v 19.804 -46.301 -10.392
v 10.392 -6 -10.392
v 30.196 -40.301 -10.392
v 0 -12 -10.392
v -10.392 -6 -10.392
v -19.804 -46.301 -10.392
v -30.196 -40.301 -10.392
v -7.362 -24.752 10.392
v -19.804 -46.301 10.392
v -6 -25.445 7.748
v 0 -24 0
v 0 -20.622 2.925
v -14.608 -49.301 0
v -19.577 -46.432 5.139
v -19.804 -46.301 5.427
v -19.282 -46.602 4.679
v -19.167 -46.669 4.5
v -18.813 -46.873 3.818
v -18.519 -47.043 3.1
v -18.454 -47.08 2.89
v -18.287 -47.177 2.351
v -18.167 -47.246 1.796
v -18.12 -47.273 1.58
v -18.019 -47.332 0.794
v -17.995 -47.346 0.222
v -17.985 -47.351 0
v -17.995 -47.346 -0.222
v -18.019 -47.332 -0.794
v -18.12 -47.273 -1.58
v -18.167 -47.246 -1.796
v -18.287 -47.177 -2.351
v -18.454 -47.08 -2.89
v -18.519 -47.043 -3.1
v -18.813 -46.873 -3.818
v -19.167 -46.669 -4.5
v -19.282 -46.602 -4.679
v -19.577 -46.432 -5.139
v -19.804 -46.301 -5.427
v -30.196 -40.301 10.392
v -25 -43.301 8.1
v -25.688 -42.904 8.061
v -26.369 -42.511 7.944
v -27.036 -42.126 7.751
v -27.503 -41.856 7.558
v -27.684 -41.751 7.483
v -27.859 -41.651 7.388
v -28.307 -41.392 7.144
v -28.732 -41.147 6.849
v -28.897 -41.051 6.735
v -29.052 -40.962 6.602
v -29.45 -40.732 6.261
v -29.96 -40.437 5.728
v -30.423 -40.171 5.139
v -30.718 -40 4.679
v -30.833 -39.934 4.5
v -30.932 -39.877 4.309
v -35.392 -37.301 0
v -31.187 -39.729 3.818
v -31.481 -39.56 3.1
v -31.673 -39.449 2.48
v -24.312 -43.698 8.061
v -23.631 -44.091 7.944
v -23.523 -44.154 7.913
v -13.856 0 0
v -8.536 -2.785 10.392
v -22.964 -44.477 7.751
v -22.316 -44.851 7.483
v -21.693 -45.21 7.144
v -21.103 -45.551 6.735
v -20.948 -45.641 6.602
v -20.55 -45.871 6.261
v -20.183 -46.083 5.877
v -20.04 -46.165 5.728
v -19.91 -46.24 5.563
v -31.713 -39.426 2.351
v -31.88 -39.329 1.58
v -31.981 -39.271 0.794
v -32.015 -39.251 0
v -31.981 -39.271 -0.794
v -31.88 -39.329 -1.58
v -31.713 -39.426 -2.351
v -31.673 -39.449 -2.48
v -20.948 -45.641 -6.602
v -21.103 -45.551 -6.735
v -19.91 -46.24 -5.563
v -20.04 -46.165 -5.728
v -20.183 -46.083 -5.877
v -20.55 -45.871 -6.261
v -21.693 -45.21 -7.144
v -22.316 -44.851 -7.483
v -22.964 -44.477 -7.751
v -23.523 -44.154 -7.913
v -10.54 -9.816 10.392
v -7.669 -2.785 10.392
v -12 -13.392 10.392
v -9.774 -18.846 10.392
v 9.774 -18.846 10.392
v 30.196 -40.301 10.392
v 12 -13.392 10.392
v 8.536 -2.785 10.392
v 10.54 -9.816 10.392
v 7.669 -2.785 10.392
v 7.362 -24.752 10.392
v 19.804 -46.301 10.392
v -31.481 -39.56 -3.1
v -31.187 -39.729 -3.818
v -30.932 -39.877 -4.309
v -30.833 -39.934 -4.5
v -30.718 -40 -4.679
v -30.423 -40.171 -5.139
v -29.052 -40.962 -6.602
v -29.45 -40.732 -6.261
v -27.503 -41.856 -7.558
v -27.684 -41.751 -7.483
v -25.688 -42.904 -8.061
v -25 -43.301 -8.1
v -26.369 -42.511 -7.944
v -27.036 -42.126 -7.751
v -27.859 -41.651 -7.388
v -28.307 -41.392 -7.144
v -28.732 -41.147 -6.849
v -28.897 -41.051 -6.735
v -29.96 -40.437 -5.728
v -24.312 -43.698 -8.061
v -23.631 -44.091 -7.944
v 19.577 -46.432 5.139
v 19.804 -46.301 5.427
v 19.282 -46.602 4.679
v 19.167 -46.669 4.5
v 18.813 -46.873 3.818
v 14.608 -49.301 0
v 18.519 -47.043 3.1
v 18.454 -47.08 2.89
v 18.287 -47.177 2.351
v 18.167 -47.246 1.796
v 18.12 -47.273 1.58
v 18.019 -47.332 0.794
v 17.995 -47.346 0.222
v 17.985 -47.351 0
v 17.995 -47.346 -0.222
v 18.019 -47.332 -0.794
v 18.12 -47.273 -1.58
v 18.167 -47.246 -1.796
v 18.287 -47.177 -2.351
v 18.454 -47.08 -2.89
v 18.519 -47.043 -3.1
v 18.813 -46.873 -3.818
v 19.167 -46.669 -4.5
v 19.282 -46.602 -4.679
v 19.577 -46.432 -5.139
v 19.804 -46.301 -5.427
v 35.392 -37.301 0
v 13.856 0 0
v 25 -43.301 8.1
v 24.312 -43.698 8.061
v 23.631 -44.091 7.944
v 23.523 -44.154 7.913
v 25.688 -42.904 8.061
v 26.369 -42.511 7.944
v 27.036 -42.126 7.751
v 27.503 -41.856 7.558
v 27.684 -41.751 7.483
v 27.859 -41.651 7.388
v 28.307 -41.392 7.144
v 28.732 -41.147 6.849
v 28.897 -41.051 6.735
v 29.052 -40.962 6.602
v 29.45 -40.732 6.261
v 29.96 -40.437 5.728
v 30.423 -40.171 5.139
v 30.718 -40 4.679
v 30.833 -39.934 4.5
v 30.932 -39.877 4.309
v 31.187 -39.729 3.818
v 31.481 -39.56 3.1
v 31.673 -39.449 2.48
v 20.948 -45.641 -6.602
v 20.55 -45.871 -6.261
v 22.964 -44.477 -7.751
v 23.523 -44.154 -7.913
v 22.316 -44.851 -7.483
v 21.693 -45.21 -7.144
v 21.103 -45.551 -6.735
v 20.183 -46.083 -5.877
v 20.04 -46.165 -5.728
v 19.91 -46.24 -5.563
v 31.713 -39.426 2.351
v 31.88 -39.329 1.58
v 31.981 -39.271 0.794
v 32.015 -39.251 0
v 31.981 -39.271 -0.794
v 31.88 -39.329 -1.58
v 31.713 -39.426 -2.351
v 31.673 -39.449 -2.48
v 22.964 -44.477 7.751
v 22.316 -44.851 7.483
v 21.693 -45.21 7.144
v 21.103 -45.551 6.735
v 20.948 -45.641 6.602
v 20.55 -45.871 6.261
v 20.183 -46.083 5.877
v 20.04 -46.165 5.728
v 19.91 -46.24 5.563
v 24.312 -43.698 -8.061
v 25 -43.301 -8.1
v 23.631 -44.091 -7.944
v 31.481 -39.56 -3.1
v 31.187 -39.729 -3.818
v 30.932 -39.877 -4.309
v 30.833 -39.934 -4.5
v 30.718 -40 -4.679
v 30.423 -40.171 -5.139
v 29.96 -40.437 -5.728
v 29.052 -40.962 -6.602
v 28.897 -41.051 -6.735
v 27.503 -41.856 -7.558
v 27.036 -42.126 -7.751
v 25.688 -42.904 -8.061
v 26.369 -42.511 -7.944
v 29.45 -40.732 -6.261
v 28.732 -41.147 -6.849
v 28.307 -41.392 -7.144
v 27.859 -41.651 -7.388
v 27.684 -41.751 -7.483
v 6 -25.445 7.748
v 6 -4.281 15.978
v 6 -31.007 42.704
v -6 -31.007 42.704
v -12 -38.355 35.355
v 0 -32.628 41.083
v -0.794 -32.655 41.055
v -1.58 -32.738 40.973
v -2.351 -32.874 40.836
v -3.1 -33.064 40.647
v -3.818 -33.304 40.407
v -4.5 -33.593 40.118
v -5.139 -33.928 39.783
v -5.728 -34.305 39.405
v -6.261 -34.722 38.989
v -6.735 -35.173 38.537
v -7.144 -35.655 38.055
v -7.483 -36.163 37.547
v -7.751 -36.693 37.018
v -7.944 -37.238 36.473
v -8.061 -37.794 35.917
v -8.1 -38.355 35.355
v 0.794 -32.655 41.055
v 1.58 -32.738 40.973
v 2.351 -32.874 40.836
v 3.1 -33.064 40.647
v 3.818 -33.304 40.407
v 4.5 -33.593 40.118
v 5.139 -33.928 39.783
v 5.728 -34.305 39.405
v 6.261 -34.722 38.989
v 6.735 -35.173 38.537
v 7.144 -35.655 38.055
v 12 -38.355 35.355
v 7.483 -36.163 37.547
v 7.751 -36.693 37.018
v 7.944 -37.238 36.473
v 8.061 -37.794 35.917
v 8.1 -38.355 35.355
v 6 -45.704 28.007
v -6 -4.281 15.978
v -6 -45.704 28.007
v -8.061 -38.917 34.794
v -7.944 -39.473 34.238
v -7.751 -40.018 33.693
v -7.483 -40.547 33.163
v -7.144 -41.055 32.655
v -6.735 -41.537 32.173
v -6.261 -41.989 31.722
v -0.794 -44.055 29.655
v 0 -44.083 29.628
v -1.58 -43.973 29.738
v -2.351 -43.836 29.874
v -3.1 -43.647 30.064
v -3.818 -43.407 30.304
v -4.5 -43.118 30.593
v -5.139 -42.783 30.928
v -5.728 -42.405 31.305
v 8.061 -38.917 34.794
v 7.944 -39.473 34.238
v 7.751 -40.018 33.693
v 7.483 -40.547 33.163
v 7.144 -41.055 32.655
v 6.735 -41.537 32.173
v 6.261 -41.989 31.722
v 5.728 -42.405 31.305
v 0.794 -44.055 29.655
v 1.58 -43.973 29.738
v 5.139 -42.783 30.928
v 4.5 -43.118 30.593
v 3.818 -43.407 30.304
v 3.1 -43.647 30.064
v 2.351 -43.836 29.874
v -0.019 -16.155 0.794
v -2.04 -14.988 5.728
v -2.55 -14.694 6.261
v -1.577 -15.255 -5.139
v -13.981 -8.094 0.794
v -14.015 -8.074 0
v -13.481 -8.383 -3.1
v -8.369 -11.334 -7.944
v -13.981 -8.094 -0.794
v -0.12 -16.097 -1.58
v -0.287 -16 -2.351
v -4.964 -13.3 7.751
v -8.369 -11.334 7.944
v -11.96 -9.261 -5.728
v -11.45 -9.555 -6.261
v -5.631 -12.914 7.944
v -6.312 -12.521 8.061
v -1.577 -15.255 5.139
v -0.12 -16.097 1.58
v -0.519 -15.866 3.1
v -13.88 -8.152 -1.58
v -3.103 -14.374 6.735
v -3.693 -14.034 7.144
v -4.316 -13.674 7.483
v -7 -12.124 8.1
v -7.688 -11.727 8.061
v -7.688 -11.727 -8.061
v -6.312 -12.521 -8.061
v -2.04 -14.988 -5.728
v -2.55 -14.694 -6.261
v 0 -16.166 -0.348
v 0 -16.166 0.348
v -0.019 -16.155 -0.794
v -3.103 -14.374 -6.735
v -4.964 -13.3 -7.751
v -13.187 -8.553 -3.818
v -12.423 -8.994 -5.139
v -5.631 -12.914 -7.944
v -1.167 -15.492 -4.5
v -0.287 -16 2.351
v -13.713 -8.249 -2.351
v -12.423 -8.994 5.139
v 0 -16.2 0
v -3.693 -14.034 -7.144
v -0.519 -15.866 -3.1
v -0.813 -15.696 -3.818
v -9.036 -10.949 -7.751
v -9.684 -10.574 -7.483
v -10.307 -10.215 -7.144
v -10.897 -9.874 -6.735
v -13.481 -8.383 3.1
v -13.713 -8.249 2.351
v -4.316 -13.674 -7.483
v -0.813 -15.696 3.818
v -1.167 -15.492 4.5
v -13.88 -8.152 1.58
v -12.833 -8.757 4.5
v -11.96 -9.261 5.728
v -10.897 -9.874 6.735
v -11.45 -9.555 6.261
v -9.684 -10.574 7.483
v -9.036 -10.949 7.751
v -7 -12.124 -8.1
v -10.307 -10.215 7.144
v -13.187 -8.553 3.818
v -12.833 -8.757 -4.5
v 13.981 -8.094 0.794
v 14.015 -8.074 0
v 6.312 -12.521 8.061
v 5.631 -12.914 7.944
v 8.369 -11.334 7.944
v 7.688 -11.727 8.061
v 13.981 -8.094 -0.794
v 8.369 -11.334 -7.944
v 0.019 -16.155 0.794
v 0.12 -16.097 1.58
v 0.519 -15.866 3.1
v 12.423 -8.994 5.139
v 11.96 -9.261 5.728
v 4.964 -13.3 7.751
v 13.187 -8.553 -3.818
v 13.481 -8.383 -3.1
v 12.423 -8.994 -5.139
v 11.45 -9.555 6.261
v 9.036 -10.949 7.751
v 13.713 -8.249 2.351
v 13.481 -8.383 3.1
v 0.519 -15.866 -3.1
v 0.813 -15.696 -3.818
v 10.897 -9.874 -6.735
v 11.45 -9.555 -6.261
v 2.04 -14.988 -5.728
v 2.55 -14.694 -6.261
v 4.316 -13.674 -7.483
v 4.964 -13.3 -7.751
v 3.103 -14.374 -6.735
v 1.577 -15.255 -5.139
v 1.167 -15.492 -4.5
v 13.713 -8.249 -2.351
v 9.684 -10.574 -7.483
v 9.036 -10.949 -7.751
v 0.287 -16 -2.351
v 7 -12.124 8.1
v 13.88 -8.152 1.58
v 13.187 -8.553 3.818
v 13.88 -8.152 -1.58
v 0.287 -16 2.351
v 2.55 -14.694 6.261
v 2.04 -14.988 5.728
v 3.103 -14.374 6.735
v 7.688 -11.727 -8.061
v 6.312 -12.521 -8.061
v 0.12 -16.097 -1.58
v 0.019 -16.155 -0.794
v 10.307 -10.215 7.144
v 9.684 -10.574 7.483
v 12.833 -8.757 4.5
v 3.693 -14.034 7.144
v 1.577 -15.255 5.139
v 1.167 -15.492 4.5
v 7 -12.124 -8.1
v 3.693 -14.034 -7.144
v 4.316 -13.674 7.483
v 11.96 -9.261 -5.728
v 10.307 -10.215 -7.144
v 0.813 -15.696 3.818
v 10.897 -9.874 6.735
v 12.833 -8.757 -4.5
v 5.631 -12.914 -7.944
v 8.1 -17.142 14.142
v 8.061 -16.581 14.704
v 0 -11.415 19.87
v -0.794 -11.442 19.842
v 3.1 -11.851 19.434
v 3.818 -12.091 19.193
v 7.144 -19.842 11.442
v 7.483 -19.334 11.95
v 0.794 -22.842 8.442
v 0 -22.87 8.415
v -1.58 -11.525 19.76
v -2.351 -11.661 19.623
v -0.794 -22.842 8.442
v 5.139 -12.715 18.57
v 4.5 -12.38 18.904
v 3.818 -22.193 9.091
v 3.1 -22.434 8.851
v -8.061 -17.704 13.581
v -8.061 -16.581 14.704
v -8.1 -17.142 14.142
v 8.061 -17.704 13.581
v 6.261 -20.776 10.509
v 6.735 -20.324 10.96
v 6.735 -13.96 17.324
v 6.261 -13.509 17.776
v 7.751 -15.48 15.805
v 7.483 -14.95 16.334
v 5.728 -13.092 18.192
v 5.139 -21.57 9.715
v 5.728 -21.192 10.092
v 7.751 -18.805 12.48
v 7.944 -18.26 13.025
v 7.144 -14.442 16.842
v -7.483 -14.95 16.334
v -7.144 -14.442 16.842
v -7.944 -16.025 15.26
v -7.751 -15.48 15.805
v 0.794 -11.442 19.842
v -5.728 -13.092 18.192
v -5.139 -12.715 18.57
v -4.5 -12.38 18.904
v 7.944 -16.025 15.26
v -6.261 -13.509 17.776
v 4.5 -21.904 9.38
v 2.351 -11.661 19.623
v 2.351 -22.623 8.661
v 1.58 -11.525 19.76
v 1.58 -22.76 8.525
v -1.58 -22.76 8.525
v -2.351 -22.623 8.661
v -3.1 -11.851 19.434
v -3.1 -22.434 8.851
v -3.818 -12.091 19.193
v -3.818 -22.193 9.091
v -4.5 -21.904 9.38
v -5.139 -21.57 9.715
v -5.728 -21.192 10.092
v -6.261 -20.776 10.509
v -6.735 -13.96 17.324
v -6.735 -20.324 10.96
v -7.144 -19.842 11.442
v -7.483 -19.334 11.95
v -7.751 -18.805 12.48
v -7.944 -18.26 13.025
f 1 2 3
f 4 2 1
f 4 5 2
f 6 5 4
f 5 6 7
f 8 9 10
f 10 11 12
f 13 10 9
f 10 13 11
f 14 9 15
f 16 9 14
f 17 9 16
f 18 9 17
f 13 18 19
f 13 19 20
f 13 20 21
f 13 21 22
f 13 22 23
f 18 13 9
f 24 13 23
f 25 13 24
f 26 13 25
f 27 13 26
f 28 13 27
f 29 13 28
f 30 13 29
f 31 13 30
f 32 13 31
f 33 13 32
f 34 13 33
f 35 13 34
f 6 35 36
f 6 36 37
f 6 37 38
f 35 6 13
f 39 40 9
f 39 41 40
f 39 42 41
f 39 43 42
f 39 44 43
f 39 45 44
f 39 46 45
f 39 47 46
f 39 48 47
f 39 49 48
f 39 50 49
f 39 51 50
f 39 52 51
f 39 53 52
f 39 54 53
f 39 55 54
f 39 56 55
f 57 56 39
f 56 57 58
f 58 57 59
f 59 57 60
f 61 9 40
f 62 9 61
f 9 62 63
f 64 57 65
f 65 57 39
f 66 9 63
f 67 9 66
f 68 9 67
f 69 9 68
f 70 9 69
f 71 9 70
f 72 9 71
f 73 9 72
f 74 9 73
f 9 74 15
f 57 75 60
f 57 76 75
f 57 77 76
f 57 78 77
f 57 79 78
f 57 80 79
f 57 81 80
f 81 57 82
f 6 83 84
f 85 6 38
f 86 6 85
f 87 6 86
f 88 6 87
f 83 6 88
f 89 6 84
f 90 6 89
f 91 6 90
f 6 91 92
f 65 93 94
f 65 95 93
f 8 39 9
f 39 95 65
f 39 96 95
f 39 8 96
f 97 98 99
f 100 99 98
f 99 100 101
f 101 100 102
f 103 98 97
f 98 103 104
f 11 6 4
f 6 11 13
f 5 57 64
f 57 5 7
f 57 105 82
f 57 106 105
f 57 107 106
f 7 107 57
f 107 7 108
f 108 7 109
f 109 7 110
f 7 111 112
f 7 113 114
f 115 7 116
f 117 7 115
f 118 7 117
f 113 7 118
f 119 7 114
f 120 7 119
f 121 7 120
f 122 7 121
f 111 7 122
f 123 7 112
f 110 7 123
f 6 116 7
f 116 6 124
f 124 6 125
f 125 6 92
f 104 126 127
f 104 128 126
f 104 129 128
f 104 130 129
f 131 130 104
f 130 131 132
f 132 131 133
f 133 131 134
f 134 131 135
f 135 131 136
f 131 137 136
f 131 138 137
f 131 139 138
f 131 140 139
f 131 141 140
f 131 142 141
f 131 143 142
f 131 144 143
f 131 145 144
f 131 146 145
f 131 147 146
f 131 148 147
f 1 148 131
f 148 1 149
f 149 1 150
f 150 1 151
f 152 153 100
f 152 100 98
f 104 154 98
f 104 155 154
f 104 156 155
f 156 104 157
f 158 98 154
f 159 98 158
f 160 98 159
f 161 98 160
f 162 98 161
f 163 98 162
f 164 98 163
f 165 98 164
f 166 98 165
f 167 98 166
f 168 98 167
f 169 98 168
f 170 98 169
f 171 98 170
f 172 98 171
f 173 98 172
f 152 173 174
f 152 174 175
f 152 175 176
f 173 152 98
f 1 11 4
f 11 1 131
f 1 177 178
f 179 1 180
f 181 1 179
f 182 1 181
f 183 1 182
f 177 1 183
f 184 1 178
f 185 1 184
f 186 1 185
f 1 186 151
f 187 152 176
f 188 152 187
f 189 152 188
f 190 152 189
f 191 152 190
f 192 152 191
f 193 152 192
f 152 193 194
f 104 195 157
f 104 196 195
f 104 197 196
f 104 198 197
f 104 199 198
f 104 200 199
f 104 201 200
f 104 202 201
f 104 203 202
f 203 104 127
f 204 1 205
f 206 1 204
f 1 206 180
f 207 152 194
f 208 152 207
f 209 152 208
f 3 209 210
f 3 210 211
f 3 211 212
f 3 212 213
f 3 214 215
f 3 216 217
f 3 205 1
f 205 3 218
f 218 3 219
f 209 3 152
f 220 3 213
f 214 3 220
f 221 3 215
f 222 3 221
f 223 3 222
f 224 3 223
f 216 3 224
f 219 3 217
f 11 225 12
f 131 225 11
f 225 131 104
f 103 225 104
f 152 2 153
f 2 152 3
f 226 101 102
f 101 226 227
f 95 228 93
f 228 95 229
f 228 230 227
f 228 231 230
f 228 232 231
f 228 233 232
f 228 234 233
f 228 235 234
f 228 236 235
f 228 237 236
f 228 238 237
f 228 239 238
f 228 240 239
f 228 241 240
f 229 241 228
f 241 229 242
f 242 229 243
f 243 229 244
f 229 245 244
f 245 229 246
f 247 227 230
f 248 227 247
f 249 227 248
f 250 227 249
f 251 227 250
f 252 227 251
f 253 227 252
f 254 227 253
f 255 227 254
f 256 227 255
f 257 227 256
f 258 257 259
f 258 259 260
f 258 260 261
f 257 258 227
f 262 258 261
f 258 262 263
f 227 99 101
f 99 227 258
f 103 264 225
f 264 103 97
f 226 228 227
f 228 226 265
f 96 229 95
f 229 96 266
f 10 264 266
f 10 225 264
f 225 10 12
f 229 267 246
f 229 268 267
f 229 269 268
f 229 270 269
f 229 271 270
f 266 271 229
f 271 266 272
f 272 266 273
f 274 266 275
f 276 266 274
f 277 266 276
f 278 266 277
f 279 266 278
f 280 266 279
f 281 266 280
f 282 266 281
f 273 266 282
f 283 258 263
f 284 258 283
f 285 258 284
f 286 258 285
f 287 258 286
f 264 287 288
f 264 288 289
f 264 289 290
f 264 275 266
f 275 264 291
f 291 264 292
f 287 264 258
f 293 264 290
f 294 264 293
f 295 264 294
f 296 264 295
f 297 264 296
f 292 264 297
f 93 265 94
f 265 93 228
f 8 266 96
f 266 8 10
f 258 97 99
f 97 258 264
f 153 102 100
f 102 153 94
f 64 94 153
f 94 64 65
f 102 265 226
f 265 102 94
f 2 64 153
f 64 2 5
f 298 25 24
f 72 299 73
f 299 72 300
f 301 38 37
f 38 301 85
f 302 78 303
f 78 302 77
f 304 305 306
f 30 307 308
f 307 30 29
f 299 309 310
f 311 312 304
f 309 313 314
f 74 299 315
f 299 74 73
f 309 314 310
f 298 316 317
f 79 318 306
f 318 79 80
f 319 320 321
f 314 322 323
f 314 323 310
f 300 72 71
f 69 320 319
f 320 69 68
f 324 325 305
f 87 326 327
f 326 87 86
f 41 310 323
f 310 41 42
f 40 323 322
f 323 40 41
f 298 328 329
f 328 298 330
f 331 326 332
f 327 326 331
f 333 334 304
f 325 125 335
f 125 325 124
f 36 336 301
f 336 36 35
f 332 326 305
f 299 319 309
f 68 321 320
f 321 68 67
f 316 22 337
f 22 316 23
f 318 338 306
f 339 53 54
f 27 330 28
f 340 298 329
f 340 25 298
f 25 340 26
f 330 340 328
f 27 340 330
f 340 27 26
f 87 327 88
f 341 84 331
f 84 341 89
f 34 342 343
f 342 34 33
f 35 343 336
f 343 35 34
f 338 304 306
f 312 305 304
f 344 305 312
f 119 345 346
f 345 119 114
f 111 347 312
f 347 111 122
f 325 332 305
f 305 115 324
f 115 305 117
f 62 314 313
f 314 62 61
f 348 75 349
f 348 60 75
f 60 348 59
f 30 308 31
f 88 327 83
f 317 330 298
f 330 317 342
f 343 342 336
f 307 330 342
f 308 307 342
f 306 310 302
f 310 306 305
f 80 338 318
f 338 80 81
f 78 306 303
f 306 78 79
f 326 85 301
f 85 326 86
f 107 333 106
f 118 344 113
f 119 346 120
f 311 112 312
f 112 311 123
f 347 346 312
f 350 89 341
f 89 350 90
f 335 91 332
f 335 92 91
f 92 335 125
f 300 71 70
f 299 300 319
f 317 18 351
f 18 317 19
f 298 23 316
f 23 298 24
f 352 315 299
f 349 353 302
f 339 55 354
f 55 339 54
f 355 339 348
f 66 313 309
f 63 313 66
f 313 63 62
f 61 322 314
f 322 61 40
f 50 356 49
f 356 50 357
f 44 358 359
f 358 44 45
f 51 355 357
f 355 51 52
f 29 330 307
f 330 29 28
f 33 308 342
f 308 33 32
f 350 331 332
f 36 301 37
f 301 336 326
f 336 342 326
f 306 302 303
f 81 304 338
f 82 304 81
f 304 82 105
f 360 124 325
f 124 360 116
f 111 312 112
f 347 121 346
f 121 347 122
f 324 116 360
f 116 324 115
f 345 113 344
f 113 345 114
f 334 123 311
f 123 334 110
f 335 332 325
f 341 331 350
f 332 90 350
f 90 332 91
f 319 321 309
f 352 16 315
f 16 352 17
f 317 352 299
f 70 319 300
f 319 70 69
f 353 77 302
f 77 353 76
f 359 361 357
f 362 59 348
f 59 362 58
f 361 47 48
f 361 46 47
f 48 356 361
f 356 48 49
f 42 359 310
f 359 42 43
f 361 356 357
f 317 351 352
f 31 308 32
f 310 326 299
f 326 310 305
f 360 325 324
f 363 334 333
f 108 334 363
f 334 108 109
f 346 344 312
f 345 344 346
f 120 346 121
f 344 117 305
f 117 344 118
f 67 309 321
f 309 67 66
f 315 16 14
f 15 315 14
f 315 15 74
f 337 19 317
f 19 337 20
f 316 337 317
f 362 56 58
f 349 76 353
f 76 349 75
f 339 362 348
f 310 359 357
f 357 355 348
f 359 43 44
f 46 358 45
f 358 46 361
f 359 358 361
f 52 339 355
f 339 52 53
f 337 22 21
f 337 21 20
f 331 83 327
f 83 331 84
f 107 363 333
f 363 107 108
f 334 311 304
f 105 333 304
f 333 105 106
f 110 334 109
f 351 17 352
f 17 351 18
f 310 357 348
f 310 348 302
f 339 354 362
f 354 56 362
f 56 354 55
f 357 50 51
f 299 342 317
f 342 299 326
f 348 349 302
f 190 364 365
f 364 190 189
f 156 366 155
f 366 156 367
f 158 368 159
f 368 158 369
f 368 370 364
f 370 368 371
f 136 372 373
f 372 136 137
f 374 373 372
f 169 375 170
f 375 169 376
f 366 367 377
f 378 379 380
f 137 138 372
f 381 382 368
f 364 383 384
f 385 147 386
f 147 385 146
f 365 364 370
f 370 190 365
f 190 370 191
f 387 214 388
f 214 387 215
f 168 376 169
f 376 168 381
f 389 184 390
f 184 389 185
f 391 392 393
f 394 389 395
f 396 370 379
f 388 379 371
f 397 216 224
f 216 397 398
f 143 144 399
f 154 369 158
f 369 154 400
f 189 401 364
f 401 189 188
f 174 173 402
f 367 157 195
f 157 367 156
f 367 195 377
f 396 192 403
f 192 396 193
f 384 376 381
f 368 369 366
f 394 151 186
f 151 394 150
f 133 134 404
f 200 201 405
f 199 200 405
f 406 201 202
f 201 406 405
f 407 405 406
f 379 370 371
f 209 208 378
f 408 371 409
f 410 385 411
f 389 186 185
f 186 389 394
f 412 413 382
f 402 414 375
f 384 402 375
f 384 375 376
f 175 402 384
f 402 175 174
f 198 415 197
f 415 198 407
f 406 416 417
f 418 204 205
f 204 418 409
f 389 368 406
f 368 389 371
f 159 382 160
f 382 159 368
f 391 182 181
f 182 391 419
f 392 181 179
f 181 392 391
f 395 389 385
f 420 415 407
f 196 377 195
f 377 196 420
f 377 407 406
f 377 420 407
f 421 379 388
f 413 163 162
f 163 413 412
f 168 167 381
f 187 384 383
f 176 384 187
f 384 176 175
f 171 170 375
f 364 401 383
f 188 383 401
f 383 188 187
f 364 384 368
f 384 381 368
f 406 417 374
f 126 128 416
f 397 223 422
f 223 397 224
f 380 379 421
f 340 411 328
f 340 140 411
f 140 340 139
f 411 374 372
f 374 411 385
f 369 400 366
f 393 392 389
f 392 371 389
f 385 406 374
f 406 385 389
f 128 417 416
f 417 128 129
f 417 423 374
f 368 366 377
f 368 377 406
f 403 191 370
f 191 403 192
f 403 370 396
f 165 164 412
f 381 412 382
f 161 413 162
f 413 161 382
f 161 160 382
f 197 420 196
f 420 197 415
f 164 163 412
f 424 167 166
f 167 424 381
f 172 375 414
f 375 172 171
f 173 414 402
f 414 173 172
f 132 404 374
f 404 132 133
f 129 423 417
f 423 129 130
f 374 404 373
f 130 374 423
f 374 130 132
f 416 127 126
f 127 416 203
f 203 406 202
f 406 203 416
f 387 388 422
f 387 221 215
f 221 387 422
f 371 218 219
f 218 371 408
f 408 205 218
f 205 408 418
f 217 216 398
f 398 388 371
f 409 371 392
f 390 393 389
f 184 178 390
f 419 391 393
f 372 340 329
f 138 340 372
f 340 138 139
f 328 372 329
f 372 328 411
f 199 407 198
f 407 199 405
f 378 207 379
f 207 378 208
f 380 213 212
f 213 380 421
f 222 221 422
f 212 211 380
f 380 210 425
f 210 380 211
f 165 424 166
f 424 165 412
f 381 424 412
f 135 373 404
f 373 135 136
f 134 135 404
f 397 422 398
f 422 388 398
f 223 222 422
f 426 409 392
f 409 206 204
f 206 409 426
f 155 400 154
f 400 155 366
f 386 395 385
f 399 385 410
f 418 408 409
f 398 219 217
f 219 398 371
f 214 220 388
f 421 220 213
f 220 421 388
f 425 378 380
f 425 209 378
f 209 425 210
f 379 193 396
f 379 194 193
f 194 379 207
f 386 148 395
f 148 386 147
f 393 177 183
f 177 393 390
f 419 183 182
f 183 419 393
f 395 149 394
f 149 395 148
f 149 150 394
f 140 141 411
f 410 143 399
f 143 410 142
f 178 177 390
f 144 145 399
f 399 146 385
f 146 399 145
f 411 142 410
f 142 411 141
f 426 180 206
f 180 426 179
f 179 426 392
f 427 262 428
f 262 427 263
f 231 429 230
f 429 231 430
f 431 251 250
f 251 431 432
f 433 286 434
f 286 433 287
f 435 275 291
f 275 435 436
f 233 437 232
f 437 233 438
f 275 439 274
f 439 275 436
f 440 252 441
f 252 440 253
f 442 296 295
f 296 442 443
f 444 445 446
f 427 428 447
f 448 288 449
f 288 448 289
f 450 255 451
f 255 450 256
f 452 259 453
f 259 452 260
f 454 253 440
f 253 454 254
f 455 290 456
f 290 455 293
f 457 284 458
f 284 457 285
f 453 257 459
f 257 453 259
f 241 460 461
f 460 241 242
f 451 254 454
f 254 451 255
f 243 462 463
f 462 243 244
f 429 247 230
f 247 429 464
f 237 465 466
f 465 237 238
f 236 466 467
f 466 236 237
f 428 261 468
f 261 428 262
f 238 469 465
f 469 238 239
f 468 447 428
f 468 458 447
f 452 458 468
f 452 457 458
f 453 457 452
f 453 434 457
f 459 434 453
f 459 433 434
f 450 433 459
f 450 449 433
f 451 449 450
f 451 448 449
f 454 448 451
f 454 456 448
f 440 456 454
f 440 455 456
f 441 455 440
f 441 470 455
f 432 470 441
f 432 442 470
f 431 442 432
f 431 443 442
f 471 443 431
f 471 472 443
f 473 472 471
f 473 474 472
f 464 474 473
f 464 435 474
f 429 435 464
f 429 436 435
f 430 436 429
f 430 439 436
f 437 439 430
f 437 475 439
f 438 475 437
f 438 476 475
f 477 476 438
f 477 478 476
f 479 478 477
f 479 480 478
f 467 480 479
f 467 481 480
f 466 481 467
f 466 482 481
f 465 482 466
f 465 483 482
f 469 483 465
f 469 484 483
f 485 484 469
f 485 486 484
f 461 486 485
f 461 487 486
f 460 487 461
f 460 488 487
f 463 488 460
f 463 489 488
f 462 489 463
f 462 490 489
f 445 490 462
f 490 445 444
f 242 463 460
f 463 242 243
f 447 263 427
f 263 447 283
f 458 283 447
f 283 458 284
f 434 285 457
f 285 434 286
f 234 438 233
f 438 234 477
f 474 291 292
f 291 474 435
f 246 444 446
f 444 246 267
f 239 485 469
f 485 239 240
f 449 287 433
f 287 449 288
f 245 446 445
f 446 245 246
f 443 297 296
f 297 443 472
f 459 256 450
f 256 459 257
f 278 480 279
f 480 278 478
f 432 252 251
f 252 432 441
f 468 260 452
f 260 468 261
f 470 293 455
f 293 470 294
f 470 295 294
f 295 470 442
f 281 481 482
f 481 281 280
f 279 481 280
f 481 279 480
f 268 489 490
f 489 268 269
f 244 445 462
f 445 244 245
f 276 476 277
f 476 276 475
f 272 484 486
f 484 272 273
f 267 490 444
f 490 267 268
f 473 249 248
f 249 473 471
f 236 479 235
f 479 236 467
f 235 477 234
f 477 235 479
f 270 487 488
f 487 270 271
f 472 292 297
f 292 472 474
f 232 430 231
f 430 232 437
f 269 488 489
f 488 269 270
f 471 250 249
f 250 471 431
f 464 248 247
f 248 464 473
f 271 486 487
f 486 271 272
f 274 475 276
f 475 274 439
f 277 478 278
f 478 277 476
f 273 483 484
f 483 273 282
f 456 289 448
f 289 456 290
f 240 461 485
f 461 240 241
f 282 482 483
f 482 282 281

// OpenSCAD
$fn=6;


big_r1 = 16.2/2;
big_r2 = 12;
h = 50;
strut_a = 45;

difference() {
union() {
    
    rotate([90,0,-30])
    translate([0,0,-10])
    cylinder(h = h+10, r=big_r2);
    
    rotate([90,0,30])
    translate([0,0,-10])
    cylinder(h = h+10, r=big_r2);
    
    
    translate([0,-3,0])
    rotate([90-strut_a,0,0])
    cylinder(h = h, r=big_r2);

} // End union

rotate([15, 0, 0])
translate([-20, 0, -20])
cube([40, 40, 40]);
rotate([-30, 0, 0])
translate([-20, 0, -20])
cube([40, 40, 40]);
translate([-20, 0, -20])
cube([40, 40, 40]);

rotate([90,0,-30])
translate([0,0,14])
cylinder(h = h, r=big_r1, $fn=64);
    
rotate([90,0,30])
translate([0,0,14])
cylinder(h = h, r=big_r1, $fn=64);


translate([0,-3,0])
rotate([90-strut_a,0,0])
translate([0,0,20])
cylinder(h = h, r=big_r1, $fn=64);
} // End difference
